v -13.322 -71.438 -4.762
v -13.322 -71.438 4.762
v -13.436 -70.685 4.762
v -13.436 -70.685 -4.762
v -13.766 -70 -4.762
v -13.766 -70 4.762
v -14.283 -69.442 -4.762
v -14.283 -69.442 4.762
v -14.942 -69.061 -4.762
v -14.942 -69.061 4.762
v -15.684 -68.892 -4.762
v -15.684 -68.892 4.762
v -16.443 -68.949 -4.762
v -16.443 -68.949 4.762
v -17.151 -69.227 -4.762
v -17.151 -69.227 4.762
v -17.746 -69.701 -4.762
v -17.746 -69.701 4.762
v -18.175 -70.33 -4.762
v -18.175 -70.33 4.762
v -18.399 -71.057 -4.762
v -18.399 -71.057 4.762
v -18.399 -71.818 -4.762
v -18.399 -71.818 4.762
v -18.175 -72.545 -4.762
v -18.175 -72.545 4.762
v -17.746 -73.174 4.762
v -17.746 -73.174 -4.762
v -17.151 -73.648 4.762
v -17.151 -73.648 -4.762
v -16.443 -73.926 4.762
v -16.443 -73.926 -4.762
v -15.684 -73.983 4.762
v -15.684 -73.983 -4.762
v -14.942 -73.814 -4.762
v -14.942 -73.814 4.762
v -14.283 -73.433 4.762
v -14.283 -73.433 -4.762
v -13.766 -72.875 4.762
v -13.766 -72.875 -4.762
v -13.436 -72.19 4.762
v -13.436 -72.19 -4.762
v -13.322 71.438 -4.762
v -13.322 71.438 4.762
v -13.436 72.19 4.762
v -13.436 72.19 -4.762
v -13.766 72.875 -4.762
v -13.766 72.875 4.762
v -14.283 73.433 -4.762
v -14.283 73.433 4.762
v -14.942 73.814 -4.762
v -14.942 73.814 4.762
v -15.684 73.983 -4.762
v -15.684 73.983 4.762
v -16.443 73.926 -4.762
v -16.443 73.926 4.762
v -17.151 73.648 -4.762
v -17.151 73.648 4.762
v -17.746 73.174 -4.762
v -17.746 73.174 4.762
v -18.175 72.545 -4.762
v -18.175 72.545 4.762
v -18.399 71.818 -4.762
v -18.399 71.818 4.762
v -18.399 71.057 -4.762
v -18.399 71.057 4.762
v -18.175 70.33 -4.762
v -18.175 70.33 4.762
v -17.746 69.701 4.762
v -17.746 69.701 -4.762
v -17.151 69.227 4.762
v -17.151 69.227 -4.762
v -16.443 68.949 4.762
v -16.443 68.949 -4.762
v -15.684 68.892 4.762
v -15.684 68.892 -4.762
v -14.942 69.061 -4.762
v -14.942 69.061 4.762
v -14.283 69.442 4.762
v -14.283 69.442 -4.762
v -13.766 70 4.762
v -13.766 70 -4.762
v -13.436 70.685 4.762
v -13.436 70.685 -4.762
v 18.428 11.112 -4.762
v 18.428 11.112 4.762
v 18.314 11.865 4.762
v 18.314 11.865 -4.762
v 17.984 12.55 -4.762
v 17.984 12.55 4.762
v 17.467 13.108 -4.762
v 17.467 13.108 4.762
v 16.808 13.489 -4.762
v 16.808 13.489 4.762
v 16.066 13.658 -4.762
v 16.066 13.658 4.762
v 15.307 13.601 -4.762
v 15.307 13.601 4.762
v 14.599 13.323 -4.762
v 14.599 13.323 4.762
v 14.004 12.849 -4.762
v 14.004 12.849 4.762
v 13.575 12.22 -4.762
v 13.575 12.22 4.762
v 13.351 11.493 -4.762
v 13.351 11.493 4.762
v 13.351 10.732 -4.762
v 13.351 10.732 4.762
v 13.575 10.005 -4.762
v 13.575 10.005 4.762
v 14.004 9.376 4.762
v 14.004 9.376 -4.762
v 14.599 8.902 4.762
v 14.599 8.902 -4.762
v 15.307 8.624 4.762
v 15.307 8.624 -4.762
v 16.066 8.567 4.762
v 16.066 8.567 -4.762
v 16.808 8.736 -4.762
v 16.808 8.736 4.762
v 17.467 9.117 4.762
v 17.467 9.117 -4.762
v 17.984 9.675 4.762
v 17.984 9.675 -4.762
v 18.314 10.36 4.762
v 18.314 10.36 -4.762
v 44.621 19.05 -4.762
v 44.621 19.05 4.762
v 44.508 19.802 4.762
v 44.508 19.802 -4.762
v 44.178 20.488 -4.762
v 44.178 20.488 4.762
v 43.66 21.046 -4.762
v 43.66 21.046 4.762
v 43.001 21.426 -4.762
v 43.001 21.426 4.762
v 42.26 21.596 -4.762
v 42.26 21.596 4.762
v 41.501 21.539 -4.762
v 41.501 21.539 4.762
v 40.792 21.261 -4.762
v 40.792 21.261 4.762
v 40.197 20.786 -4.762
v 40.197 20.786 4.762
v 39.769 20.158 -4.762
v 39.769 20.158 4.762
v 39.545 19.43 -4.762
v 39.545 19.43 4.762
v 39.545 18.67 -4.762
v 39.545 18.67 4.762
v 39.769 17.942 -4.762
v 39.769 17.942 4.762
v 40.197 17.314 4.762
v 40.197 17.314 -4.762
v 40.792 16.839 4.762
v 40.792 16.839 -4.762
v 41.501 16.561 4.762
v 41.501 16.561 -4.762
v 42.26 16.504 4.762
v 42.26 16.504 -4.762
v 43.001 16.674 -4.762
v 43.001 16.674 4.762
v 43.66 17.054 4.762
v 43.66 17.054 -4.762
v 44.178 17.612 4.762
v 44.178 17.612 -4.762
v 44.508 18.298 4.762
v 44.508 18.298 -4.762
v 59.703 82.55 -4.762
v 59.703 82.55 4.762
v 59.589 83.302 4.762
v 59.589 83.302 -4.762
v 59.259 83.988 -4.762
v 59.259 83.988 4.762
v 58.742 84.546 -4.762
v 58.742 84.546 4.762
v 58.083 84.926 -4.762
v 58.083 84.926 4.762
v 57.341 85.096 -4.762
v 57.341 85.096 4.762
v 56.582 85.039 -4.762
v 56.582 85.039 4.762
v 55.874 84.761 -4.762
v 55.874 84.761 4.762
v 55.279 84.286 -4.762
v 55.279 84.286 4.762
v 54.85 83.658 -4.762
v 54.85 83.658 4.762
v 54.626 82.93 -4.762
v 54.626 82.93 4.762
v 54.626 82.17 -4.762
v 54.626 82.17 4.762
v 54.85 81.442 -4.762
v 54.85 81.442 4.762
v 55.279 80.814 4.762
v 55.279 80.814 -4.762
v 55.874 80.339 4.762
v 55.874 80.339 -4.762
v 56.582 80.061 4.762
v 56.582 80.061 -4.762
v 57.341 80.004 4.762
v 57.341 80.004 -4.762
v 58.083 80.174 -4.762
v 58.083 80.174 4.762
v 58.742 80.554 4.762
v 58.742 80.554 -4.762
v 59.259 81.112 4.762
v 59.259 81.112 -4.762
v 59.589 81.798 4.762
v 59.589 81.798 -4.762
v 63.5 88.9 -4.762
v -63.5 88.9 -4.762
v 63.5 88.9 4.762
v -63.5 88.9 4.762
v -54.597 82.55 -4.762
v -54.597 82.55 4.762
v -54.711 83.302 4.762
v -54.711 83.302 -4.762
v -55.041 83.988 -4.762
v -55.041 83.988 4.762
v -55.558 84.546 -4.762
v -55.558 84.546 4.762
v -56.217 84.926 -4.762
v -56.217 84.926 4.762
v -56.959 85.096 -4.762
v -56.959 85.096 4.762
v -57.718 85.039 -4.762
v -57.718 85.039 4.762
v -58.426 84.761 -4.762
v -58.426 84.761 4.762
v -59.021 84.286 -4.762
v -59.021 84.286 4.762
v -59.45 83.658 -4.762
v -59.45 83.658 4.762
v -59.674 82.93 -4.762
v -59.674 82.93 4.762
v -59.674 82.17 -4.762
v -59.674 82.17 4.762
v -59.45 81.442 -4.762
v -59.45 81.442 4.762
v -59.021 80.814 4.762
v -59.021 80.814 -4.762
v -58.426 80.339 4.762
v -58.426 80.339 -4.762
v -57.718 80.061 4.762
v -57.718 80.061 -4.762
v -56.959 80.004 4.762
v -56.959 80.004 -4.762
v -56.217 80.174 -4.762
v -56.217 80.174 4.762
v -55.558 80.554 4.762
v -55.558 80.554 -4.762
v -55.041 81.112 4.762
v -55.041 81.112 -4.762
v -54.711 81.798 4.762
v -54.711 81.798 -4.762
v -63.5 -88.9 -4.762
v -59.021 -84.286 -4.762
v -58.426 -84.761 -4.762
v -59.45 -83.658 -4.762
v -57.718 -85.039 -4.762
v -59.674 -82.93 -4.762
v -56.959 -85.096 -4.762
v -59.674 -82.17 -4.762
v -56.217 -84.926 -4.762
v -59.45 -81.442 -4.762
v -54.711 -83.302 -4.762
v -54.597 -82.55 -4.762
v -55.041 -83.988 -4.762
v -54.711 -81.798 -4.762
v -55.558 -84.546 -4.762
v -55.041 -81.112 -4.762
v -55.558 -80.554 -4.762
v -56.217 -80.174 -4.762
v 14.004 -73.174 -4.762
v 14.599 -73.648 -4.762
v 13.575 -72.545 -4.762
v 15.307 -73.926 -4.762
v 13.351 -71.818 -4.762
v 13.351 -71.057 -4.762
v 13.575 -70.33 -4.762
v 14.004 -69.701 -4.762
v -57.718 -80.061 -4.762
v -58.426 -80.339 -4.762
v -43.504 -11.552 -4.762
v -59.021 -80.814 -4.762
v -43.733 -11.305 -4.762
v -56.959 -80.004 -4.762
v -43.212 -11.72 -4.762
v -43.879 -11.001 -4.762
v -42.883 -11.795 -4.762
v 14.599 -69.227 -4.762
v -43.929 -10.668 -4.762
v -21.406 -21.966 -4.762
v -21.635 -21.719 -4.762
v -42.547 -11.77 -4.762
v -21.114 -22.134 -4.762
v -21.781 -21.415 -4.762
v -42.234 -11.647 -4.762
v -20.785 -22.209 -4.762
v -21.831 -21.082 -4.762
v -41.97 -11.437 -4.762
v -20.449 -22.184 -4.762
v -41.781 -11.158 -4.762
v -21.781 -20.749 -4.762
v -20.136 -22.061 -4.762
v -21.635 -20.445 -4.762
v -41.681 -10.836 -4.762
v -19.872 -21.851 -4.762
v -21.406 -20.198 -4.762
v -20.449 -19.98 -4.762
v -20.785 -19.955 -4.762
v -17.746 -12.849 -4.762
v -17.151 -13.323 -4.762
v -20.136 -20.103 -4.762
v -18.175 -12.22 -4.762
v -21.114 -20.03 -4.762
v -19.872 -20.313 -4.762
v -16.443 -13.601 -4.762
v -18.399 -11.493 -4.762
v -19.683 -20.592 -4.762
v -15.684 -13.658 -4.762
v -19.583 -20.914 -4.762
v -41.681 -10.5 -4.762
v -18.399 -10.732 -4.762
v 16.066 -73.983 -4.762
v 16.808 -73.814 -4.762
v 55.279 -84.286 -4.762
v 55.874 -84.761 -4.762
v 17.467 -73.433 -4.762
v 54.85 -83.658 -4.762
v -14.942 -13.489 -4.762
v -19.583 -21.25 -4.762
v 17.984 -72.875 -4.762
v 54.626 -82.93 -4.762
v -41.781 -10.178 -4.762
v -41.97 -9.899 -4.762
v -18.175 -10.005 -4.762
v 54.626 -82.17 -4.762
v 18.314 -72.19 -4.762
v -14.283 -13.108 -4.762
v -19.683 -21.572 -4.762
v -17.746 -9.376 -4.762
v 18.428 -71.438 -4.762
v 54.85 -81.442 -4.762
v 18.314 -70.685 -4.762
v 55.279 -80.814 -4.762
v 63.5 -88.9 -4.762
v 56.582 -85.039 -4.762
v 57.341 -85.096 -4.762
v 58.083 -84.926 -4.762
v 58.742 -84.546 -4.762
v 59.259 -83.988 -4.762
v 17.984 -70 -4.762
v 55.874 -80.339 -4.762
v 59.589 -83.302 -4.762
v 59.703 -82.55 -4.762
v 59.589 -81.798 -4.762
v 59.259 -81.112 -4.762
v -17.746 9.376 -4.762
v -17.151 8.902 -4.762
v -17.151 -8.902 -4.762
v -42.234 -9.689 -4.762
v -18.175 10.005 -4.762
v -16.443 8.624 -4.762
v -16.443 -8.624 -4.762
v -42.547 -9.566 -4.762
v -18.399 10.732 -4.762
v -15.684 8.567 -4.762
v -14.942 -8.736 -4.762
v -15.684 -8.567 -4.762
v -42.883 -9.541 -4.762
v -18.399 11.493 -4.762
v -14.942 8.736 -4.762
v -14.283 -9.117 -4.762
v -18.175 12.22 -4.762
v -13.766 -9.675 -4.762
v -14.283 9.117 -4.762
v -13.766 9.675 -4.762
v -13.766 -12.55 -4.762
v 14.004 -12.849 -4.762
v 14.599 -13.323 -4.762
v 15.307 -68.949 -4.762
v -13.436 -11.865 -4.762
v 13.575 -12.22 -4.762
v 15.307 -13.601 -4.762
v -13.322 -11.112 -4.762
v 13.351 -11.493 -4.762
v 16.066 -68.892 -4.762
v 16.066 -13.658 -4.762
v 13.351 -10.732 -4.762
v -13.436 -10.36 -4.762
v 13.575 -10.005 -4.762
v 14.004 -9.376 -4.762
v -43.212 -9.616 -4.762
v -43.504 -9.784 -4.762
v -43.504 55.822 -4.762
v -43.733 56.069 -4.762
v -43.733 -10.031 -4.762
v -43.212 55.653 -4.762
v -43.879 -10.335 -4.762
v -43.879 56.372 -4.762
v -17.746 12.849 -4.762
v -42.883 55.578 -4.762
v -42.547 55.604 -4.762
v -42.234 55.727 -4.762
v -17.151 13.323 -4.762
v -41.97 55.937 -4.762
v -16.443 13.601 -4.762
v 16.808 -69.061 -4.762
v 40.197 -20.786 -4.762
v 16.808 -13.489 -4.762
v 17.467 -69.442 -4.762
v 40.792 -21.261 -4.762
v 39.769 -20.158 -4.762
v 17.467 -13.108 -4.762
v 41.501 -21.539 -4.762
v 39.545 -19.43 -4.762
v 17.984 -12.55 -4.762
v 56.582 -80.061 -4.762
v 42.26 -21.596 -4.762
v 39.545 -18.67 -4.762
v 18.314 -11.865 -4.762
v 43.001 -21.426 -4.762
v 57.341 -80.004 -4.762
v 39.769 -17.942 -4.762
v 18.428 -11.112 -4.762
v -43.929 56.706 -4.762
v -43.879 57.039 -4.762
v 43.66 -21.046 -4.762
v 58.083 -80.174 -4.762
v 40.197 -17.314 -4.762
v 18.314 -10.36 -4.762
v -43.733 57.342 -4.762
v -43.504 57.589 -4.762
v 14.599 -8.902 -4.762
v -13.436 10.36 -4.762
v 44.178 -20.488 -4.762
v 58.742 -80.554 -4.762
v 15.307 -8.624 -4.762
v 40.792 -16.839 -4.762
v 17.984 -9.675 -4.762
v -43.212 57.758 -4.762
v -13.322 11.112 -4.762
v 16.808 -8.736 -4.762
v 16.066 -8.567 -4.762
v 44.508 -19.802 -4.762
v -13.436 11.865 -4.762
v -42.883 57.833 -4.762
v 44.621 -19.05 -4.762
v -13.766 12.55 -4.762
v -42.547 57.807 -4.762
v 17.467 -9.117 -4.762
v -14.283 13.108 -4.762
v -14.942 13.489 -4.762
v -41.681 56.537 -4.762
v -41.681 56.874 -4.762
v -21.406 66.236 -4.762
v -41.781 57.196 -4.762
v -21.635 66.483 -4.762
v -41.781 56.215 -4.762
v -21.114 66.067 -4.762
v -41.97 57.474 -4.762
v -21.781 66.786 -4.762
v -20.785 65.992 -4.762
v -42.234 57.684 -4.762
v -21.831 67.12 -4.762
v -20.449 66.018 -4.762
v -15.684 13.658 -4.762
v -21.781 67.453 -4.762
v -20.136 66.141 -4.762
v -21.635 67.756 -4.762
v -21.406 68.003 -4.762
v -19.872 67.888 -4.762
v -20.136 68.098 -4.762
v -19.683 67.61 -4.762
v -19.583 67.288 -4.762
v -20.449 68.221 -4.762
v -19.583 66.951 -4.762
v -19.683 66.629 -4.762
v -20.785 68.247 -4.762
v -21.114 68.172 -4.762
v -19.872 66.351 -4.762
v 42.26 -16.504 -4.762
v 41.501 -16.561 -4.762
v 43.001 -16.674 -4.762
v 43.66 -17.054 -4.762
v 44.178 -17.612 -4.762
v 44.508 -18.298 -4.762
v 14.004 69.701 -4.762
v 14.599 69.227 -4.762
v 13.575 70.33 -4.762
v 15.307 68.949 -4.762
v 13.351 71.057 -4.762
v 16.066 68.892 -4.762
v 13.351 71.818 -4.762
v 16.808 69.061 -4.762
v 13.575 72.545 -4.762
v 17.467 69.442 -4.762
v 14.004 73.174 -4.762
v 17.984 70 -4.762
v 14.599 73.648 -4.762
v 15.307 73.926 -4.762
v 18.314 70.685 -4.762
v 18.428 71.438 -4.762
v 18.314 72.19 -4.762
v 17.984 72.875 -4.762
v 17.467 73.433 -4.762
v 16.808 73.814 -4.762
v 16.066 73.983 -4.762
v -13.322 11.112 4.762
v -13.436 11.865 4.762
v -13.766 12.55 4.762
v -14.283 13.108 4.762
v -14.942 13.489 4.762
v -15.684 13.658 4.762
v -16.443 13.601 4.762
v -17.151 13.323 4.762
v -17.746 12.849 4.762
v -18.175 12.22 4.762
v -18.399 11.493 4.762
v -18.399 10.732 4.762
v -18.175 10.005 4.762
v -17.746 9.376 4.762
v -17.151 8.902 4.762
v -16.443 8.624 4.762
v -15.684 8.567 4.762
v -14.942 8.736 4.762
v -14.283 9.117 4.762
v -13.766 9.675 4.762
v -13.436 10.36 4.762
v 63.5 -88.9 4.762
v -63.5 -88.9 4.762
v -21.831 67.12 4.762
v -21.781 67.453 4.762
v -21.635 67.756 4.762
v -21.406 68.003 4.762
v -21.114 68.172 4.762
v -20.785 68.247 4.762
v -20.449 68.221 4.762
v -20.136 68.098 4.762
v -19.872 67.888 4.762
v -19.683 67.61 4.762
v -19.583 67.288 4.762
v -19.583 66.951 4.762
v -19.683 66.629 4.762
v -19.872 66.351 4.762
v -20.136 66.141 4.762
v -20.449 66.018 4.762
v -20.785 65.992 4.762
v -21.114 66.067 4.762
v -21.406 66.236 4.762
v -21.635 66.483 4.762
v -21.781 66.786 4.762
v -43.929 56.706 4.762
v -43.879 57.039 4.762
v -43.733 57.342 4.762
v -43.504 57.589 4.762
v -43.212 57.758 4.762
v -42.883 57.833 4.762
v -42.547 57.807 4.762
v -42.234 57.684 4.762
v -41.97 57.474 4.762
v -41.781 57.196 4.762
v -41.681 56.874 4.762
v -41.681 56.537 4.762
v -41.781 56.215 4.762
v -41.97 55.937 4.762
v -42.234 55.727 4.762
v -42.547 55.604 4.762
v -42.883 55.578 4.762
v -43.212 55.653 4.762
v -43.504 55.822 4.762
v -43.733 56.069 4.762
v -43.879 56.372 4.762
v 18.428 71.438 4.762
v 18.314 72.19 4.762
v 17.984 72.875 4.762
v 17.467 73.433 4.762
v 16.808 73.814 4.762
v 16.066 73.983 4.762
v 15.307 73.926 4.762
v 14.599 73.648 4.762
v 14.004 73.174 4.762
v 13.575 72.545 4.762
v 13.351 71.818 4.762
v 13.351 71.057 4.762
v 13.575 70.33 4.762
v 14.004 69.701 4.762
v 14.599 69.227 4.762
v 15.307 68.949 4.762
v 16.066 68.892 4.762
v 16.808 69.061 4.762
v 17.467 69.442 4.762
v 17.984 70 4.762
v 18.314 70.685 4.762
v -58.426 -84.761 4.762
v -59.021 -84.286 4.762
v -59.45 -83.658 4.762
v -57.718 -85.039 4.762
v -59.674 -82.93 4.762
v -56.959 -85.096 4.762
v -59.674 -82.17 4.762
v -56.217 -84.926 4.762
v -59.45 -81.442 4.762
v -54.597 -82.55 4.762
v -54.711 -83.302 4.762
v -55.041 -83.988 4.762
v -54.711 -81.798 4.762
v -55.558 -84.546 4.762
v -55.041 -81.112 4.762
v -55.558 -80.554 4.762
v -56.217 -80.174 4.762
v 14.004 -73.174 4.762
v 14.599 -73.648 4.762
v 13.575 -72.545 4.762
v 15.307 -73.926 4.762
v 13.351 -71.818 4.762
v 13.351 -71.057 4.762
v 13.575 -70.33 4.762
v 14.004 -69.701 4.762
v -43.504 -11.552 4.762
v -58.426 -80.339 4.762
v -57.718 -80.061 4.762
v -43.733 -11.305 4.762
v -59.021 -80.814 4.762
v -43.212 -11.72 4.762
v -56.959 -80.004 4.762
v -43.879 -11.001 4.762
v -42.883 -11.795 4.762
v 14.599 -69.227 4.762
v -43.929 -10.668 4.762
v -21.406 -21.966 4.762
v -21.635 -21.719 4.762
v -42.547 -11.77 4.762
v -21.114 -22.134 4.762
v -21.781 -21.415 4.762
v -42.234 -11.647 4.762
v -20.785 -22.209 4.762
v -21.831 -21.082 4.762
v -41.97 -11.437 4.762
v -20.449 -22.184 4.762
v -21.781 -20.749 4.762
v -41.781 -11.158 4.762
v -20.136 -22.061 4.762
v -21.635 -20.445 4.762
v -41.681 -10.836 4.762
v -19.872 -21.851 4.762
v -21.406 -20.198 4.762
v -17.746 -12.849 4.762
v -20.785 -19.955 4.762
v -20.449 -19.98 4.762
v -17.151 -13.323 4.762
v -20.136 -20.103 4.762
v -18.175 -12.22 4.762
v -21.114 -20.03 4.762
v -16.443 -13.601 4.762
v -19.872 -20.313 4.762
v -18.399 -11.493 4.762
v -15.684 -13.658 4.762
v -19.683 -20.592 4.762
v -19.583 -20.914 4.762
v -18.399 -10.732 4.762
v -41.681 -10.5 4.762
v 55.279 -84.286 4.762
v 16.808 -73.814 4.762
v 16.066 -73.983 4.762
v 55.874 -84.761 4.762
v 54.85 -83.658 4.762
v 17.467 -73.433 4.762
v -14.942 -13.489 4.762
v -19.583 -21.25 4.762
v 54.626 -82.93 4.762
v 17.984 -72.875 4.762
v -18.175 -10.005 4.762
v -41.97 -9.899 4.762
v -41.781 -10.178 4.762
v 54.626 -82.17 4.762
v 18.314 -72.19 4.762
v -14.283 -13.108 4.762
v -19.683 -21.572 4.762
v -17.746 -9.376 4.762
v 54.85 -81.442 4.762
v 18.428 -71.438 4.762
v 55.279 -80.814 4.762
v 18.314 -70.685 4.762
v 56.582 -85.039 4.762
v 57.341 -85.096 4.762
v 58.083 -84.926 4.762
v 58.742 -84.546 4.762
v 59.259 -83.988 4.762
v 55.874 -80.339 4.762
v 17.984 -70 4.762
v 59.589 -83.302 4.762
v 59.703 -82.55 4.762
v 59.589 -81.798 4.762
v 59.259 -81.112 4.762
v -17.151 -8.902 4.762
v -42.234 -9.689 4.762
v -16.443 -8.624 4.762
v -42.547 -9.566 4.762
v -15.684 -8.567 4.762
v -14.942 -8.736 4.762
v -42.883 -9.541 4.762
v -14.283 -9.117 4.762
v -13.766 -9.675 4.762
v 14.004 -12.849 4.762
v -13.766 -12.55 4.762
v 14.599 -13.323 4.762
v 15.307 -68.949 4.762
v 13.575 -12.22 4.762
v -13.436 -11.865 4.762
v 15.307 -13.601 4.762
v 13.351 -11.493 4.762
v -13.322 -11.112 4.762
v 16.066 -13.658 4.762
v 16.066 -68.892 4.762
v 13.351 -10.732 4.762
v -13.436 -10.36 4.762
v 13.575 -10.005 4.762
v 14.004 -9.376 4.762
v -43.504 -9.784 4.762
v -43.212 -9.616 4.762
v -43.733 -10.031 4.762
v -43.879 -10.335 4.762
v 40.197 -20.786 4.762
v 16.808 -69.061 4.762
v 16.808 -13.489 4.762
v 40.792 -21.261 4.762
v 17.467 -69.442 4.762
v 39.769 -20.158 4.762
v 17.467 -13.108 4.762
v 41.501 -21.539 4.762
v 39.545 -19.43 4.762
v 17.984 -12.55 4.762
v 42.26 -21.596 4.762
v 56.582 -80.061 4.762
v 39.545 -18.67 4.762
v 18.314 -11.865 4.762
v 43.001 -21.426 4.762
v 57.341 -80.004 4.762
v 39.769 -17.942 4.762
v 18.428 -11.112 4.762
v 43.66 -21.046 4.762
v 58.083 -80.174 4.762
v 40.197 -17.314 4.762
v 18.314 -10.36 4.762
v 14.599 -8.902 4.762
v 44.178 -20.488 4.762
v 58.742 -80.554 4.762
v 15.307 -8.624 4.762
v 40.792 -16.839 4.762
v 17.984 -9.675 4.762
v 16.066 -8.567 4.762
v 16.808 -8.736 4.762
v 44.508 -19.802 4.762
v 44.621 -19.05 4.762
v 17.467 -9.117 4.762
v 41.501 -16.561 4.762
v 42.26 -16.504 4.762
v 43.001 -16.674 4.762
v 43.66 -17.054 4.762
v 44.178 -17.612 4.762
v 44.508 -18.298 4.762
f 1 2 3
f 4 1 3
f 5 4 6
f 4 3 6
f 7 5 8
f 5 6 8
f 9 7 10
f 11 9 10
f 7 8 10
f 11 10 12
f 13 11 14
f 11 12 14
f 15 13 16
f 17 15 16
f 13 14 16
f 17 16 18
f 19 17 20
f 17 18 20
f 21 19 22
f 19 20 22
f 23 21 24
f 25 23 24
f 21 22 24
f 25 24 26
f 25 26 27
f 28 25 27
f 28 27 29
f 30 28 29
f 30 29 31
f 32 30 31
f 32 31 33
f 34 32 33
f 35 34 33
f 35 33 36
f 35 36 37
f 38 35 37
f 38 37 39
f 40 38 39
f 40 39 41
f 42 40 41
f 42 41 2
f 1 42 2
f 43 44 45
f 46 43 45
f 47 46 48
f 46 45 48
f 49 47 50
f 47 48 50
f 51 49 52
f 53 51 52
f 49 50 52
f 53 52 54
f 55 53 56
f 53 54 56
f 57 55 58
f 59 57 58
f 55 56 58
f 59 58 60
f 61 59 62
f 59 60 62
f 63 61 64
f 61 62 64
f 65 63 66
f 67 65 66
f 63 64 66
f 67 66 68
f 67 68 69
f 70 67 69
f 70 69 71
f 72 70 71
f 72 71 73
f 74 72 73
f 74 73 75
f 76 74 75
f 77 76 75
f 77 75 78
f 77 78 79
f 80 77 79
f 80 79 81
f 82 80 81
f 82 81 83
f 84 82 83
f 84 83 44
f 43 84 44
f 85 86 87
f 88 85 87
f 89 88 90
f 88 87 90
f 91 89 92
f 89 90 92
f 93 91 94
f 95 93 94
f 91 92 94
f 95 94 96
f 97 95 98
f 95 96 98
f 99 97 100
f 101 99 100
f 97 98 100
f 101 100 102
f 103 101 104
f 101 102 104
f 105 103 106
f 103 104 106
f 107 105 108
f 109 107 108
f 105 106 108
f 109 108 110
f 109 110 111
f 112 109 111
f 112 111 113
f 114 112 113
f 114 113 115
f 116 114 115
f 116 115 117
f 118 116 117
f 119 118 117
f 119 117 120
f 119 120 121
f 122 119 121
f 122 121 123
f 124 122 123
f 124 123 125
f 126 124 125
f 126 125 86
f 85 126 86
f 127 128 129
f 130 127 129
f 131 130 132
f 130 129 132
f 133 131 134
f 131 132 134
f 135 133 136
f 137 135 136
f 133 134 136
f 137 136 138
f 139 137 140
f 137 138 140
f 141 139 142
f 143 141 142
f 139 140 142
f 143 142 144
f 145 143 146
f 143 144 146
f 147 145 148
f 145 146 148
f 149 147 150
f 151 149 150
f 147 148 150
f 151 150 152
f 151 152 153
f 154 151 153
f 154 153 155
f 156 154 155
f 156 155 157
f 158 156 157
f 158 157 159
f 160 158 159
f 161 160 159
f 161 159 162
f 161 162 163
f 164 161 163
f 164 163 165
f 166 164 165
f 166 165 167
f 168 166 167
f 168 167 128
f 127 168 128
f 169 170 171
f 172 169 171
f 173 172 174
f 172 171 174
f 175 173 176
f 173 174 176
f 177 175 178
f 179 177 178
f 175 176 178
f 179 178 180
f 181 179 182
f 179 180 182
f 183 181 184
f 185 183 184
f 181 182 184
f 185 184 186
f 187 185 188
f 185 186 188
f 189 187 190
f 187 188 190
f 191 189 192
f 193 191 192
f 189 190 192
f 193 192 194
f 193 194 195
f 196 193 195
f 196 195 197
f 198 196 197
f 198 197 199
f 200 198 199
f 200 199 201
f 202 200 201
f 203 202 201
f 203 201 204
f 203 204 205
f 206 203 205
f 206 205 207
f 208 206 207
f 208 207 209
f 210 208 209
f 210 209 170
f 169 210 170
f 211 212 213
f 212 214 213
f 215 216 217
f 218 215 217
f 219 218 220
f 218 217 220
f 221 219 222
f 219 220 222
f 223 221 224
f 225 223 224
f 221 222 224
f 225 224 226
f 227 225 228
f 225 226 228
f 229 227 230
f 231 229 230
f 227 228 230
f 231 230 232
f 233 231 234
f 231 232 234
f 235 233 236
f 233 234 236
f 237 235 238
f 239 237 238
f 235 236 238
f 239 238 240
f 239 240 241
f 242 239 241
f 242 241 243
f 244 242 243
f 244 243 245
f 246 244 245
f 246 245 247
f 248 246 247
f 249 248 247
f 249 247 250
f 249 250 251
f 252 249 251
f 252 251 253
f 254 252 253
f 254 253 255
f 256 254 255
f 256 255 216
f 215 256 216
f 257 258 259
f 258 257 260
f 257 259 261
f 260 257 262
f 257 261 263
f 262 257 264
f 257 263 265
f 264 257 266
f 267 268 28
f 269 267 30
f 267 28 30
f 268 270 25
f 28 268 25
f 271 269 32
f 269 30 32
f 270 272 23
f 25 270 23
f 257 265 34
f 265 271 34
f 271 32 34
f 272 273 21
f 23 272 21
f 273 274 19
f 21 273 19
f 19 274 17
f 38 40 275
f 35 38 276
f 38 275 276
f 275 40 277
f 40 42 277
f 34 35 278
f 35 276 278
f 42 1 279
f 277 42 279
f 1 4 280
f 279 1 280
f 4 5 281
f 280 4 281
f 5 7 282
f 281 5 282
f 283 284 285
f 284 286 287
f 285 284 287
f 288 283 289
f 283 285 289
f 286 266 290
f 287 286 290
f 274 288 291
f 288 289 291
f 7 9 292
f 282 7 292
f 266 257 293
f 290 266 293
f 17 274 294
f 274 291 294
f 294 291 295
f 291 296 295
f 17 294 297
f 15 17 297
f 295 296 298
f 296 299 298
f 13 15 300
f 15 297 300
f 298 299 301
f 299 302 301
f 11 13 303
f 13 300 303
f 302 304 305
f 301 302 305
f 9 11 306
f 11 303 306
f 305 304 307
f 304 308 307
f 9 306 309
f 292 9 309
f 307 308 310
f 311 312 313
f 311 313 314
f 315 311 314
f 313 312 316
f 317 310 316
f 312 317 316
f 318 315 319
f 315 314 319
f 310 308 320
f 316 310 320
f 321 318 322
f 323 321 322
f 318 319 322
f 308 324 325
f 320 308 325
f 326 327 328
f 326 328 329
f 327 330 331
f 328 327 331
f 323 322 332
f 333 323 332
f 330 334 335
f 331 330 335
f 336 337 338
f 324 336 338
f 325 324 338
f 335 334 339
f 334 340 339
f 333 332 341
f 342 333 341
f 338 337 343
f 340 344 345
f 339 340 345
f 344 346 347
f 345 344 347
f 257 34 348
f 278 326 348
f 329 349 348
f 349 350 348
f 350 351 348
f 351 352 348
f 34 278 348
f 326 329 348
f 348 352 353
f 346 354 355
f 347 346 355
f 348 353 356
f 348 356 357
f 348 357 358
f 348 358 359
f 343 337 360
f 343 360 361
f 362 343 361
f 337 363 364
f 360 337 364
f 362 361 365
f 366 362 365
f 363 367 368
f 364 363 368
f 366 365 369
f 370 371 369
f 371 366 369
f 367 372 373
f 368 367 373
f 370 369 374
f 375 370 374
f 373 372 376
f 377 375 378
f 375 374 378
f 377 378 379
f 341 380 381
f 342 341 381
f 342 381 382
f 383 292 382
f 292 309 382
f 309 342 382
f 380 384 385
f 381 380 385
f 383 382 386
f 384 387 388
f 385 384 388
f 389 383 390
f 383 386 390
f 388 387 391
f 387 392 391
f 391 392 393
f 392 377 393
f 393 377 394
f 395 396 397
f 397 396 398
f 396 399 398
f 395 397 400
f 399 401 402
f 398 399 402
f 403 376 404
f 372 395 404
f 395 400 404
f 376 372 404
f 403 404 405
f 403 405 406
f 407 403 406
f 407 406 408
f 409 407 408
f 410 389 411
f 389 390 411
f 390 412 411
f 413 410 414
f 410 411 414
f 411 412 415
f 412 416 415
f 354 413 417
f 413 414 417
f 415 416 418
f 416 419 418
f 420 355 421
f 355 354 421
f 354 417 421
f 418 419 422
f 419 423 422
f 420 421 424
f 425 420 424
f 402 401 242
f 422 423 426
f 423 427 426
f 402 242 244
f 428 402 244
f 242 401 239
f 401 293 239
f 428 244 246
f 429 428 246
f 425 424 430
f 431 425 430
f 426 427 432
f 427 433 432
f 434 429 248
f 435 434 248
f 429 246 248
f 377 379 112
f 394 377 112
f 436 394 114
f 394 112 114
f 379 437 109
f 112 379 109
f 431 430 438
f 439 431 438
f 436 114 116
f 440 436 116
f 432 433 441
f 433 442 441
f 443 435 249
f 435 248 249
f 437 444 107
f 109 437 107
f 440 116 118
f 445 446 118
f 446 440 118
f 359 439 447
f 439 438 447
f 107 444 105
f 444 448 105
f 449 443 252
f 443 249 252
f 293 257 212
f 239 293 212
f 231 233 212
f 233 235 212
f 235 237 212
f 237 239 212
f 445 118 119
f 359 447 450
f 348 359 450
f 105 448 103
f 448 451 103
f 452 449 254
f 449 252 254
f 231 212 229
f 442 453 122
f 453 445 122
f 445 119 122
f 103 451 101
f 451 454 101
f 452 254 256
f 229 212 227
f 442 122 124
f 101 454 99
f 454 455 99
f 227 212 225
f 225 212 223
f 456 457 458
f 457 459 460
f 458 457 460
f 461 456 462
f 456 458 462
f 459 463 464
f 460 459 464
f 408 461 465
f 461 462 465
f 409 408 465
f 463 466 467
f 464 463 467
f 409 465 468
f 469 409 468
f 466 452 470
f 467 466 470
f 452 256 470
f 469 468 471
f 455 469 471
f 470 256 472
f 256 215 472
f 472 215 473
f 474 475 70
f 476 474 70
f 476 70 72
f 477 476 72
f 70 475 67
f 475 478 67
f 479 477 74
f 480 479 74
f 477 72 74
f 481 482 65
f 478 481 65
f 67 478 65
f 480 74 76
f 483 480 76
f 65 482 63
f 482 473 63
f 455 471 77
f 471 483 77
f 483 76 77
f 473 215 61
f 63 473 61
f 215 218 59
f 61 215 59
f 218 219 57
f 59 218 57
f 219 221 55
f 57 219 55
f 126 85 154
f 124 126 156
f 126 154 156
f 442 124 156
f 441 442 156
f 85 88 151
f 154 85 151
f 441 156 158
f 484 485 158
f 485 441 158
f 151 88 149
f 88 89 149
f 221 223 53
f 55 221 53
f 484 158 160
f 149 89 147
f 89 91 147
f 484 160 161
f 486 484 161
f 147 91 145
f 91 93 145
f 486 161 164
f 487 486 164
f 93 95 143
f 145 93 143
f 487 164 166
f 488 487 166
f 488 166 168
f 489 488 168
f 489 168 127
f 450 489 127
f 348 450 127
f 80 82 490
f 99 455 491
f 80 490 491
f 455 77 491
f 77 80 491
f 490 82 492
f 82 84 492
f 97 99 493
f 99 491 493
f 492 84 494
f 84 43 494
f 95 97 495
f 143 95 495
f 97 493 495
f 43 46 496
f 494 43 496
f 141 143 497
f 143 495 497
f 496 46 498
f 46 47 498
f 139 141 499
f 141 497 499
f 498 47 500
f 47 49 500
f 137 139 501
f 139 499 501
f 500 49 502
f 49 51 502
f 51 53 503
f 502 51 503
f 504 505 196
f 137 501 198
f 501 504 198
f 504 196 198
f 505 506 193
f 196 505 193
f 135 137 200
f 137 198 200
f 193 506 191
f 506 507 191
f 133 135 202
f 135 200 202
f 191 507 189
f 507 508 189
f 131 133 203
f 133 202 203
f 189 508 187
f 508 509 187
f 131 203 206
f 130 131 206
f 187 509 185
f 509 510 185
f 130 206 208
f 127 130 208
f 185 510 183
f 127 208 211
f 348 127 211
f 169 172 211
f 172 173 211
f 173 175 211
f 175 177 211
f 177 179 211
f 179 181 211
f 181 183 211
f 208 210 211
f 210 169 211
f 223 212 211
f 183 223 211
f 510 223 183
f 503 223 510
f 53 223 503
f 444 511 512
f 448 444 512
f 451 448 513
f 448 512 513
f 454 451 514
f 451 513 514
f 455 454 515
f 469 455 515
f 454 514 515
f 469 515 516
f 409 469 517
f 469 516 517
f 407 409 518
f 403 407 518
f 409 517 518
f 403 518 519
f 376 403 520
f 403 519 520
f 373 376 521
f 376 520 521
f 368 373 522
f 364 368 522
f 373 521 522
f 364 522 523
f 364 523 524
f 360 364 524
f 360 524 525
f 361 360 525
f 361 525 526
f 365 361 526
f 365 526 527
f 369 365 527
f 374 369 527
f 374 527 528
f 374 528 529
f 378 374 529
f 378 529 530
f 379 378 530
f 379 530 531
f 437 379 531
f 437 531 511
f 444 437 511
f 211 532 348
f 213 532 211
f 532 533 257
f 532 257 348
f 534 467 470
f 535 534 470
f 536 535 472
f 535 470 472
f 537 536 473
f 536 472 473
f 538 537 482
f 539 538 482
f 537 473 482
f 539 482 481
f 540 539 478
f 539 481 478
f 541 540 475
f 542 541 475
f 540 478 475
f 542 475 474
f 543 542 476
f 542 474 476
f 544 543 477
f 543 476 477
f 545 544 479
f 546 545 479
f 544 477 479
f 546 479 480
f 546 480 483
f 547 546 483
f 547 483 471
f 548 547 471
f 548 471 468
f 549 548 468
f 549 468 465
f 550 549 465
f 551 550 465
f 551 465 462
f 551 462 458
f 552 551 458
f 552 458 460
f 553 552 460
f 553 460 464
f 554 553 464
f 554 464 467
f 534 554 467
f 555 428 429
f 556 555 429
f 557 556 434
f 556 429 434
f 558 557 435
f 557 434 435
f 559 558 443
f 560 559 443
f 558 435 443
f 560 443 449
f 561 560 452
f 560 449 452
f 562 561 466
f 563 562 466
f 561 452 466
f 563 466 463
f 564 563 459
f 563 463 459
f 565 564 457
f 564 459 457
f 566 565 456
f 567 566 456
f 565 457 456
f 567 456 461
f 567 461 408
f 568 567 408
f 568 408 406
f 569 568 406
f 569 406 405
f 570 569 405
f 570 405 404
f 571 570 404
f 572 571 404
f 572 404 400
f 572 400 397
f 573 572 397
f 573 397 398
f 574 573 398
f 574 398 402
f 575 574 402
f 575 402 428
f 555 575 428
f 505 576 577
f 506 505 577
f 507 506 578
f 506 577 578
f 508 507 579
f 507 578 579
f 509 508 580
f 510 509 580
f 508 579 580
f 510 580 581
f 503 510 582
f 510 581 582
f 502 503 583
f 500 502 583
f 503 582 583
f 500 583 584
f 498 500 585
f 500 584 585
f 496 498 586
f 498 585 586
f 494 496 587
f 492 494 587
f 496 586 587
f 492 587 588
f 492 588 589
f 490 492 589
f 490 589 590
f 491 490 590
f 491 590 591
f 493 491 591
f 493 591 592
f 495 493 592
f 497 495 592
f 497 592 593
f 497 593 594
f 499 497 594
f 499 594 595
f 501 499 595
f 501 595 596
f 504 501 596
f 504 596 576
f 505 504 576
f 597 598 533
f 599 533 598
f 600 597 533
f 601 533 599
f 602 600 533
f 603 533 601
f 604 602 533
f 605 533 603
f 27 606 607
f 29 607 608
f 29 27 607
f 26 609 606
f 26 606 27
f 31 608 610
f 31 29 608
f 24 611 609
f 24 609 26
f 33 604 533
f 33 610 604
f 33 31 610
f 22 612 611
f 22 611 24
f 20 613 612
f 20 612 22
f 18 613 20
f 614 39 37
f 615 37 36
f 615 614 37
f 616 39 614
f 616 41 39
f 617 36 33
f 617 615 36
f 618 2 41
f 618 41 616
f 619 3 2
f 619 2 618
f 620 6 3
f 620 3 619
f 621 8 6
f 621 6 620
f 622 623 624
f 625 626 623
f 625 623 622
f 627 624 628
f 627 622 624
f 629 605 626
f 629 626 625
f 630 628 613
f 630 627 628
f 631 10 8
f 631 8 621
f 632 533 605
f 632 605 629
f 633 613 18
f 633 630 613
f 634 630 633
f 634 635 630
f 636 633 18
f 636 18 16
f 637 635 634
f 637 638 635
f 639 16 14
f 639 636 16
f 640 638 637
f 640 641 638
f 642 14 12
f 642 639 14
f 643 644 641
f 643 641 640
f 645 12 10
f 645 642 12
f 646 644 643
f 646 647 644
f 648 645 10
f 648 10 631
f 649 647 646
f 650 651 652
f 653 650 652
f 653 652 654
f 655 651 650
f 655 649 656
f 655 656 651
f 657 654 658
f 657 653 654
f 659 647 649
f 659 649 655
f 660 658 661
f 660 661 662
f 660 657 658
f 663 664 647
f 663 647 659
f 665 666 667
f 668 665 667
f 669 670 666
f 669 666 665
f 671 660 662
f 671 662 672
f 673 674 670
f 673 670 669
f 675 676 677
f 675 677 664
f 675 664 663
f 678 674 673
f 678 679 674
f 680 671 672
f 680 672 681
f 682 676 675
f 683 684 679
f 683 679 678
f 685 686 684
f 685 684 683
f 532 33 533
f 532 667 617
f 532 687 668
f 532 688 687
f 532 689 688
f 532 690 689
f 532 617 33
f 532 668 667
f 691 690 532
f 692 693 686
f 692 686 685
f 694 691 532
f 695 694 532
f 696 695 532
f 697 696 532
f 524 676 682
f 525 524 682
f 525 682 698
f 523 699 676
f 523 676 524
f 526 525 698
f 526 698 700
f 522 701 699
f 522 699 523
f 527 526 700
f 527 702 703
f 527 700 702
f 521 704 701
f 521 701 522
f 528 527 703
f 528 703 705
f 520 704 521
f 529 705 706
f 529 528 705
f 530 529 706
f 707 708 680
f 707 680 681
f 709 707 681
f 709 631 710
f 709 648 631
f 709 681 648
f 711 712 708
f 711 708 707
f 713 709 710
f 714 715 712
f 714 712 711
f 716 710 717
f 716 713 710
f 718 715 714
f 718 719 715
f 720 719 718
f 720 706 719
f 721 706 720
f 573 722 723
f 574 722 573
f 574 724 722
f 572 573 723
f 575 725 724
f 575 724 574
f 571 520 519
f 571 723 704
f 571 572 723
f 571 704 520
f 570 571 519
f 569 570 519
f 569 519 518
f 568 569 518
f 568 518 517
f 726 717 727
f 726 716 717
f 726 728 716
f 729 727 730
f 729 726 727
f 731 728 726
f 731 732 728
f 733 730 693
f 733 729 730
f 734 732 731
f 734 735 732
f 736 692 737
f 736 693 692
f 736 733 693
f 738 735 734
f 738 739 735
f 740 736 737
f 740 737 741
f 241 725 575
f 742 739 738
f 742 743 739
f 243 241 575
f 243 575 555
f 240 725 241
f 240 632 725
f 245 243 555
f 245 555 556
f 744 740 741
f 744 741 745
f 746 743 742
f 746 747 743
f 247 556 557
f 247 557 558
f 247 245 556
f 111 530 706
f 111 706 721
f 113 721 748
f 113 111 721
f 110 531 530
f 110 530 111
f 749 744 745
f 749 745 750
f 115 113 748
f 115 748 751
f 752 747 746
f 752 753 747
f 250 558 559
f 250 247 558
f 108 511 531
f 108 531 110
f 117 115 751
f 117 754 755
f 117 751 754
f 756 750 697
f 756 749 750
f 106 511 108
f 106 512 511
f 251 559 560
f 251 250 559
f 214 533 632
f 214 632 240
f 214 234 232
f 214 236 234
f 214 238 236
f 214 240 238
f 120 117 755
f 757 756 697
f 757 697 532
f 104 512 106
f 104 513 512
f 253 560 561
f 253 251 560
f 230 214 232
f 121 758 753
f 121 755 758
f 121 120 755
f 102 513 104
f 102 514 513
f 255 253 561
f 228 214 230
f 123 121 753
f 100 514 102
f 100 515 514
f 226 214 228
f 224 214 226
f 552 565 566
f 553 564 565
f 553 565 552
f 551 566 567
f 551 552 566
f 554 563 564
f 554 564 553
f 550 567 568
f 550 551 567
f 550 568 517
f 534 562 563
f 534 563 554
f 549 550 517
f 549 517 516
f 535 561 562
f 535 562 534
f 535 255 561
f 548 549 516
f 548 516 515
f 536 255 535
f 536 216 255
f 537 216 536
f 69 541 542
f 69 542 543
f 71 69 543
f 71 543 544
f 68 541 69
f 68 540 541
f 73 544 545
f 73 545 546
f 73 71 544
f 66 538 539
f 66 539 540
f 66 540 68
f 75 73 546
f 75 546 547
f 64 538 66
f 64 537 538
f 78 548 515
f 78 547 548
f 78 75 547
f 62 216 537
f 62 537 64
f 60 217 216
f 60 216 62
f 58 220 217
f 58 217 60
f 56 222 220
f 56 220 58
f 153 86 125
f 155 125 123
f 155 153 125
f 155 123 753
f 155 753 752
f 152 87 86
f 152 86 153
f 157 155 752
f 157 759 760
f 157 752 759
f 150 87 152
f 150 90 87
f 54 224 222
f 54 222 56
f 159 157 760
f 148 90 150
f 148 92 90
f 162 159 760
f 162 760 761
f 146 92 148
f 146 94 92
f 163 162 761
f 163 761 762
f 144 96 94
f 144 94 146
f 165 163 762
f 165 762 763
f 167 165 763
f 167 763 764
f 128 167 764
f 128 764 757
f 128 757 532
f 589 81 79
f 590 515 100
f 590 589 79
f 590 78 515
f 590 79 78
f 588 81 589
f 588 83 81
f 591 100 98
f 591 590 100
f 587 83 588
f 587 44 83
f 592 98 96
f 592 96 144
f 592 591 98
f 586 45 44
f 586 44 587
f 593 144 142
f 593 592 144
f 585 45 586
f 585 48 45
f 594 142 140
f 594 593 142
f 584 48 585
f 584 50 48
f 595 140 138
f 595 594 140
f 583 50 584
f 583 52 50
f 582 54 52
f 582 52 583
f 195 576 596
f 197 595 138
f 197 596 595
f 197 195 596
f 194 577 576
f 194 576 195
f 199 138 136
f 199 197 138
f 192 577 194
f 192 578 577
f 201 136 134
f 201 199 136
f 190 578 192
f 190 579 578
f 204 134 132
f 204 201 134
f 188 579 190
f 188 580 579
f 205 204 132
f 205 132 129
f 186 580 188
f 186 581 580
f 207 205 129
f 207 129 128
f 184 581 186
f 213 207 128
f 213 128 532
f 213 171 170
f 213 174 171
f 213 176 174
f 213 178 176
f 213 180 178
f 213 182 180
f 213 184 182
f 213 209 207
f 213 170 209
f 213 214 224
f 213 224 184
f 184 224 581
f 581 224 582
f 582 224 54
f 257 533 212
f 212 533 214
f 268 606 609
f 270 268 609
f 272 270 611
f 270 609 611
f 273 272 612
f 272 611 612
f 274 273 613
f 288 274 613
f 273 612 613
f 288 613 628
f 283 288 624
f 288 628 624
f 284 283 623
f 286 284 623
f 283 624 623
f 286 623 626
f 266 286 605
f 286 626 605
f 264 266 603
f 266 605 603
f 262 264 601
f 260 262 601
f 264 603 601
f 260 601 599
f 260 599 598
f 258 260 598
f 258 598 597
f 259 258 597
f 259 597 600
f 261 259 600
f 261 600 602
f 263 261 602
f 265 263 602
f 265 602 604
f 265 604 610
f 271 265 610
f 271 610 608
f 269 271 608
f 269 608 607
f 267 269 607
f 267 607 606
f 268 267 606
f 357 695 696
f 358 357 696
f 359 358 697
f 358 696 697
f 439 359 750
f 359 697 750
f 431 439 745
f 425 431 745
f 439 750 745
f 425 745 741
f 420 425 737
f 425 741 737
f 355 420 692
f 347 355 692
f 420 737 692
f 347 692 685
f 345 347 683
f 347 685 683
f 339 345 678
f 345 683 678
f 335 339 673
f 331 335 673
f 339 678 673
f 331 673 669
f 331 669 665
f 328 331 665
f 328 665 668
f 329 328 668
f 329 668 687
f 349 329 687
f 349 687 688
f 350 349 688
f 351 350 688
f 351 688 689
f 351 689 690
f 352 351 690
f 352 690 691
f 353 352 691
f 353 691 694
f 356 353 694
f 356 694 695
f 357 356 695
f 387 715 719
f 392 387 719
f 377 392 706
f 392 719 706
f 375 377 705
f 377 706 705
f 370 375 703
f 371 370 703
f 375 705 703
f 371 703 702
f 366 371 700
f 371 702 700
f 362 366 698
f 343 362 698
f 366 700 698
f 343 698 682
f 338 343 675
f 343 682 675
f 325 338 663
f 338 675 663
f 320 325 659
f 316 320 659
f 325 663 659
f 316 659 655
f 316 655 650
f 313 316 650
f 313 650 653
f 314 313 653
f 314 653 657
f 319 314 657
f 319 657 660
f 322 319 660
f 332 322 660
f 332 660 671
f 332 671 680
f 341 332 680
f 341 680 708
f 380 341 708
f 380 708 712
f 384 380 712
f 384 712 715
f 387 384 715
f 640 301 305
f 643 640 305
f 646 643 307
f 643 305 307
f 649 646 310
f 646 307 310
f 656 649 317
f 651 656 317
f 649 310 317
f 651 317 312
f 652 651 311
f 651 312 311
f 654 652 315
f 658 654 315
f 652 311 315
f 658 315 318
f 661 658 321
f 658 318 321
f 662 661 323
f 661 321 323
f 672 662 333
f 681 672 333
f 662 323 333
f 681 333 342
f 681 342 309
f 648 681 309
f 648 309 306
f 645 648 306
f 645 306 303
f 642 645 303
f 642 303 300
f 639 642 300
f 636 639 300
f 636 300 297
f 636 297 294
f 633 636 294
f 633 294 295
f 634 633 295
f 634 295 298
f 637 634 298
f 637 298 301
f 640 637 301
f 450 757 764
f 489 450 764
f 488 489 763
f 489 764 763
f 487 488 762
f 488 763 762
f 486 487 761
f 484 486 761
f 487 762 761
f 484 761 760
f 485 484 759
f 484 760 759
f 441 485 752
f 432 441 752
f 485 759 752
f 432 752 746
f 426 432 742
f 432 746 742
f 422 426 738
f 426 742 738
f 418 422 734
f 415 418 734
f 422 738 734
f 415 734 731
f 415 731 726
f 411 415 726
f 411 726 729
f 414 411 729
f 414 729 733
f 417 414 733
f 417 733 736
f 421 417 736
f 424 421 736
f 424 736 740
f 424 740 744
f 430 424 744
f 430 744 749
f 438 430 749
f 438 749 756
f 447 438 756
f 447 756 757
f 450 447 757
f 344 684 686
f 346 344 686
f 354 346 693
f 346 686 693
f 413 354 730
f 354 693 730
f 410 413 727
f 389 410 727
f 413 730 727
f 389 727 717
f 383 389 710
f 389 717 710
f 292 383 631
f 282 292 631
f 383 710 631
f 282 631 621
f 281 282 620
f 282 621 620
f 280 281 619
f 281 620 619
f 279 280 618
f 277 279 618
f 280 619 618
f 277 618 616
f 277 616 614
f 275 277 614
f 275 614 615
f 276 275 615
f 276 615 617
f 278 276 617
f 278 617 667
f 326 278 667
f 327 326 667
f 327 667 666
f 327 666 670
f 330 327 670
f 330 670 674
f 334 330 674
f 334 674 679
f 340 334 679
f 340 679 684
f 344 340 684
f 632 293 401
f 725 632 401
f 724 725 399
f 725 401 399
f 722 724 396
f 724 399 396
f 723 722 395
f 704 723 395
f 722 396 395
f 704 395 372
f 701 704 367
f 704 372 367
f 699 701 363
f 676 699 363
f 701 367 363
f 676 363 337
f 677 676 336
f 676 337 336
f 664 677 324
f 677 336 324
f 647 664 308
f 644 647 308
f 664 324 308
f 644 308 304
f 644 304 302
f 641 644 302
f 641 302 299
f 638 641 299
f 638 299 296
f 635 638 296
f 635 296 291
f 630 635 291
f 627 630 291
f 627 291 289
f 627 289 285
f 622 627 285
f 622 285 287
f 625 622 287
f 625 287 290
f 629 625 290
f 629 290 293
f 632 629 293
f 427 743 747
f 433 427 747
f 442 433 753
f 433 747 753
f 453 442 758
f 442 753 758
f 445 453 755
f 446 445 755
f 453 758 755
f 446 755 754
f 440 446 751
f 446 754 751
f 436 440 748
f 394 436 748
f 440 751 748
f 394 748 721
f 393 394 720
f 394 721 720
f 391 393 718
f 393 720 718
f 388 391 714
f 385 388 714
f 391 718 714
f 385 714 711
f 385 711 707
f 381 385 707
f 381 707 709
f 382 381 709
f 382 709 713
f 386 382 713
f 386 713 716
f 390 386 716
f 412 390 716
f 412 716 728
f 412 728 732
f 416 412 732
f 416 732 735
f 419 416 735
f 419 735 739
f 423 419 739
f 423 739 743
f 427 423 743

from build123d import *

# Parameters (mm, degrees)
SKETCH1_W                         = 127
SKETCH1_H                         = 177.8
BOSS_EXTRUDE1_DEPTH               = 4.7625
F_10_CLEARANCE_HOLE1_D            = 5.1054
TAPPED_HOLE_FOR_10_32_HELICOIL1_D = 5.1054
TAPPED_HOLE_FOR_10_32_HELICOIL2_D = 5.1054
F_4_40_TAPPED_HOLE1_D             = 2.2606


with BuildPart() as part:
    # Sketch1 → Boss-Extrude1 (new, symmetric)
    with BuildSketch(Plane.XY):
        Rectangle(SKETCH1_W, SKETCH1_H)
    extrude(amount=BOSS_EXTRUDE1_DEPTH, both=True)

    # #10 Clearance Hole1 (through all)
    with Locations(Plane(origin=(0, 0, -4.7625), x_dir=(-1, 0, 0), z_dir=(0, 0, -1))):
        with Locations((-57.15, 82.55), (57.15, 82.55), (57.15, -82.55), (-57.15, -82.55)):
            Hole(F_10_CLEARANCE_HOLE1_D / 2)

    # Tapped Hole for #10-32 Helicoil1 (through all)
    with Locations(Plane(origin=(0, 0, -4.7625), x_dir=(-1, 0, 0), z_dir=(0, 0, -1))):
        with Locations((-15.875, 71.4375), (15.875, 11.1125), (-15.875, 11.1125), (15.875, 71.4375), (-15.875, -11.1125), (15.875, -71.4375), (-15.875, -71.4375), (15.875, -11.1125)):
            Hole(TAPPED_HOLE_FOR_10_32_HELICOIL1_D / 2)

    # Tapped Hole for #10-32 Helicoil2 (through all)
    with Locations(Plane(origin=(0, 0, -4.7625), x_dir=(-1, 0, 0), z_dir=(0, 0, -1))):
        with Locations((-42.06875, 19.05), (-42.06875, -19.05)):
            Hole(TAPPED_HOLE_FOR_10_32_HELICOIL2_D / 2)

    # #4-40 Tapped Hole1 (through all)
    with Locations(Plane.XY.offset(4.7625)):
        with Locations((-20.701, 67.1195), (-42.799, 56.7055), (-20.701, -21.082), (-42.799, -10.668)):
            Hole(F_4_40_TAPPED_HOLE1_D / 2)


solid = part.part
